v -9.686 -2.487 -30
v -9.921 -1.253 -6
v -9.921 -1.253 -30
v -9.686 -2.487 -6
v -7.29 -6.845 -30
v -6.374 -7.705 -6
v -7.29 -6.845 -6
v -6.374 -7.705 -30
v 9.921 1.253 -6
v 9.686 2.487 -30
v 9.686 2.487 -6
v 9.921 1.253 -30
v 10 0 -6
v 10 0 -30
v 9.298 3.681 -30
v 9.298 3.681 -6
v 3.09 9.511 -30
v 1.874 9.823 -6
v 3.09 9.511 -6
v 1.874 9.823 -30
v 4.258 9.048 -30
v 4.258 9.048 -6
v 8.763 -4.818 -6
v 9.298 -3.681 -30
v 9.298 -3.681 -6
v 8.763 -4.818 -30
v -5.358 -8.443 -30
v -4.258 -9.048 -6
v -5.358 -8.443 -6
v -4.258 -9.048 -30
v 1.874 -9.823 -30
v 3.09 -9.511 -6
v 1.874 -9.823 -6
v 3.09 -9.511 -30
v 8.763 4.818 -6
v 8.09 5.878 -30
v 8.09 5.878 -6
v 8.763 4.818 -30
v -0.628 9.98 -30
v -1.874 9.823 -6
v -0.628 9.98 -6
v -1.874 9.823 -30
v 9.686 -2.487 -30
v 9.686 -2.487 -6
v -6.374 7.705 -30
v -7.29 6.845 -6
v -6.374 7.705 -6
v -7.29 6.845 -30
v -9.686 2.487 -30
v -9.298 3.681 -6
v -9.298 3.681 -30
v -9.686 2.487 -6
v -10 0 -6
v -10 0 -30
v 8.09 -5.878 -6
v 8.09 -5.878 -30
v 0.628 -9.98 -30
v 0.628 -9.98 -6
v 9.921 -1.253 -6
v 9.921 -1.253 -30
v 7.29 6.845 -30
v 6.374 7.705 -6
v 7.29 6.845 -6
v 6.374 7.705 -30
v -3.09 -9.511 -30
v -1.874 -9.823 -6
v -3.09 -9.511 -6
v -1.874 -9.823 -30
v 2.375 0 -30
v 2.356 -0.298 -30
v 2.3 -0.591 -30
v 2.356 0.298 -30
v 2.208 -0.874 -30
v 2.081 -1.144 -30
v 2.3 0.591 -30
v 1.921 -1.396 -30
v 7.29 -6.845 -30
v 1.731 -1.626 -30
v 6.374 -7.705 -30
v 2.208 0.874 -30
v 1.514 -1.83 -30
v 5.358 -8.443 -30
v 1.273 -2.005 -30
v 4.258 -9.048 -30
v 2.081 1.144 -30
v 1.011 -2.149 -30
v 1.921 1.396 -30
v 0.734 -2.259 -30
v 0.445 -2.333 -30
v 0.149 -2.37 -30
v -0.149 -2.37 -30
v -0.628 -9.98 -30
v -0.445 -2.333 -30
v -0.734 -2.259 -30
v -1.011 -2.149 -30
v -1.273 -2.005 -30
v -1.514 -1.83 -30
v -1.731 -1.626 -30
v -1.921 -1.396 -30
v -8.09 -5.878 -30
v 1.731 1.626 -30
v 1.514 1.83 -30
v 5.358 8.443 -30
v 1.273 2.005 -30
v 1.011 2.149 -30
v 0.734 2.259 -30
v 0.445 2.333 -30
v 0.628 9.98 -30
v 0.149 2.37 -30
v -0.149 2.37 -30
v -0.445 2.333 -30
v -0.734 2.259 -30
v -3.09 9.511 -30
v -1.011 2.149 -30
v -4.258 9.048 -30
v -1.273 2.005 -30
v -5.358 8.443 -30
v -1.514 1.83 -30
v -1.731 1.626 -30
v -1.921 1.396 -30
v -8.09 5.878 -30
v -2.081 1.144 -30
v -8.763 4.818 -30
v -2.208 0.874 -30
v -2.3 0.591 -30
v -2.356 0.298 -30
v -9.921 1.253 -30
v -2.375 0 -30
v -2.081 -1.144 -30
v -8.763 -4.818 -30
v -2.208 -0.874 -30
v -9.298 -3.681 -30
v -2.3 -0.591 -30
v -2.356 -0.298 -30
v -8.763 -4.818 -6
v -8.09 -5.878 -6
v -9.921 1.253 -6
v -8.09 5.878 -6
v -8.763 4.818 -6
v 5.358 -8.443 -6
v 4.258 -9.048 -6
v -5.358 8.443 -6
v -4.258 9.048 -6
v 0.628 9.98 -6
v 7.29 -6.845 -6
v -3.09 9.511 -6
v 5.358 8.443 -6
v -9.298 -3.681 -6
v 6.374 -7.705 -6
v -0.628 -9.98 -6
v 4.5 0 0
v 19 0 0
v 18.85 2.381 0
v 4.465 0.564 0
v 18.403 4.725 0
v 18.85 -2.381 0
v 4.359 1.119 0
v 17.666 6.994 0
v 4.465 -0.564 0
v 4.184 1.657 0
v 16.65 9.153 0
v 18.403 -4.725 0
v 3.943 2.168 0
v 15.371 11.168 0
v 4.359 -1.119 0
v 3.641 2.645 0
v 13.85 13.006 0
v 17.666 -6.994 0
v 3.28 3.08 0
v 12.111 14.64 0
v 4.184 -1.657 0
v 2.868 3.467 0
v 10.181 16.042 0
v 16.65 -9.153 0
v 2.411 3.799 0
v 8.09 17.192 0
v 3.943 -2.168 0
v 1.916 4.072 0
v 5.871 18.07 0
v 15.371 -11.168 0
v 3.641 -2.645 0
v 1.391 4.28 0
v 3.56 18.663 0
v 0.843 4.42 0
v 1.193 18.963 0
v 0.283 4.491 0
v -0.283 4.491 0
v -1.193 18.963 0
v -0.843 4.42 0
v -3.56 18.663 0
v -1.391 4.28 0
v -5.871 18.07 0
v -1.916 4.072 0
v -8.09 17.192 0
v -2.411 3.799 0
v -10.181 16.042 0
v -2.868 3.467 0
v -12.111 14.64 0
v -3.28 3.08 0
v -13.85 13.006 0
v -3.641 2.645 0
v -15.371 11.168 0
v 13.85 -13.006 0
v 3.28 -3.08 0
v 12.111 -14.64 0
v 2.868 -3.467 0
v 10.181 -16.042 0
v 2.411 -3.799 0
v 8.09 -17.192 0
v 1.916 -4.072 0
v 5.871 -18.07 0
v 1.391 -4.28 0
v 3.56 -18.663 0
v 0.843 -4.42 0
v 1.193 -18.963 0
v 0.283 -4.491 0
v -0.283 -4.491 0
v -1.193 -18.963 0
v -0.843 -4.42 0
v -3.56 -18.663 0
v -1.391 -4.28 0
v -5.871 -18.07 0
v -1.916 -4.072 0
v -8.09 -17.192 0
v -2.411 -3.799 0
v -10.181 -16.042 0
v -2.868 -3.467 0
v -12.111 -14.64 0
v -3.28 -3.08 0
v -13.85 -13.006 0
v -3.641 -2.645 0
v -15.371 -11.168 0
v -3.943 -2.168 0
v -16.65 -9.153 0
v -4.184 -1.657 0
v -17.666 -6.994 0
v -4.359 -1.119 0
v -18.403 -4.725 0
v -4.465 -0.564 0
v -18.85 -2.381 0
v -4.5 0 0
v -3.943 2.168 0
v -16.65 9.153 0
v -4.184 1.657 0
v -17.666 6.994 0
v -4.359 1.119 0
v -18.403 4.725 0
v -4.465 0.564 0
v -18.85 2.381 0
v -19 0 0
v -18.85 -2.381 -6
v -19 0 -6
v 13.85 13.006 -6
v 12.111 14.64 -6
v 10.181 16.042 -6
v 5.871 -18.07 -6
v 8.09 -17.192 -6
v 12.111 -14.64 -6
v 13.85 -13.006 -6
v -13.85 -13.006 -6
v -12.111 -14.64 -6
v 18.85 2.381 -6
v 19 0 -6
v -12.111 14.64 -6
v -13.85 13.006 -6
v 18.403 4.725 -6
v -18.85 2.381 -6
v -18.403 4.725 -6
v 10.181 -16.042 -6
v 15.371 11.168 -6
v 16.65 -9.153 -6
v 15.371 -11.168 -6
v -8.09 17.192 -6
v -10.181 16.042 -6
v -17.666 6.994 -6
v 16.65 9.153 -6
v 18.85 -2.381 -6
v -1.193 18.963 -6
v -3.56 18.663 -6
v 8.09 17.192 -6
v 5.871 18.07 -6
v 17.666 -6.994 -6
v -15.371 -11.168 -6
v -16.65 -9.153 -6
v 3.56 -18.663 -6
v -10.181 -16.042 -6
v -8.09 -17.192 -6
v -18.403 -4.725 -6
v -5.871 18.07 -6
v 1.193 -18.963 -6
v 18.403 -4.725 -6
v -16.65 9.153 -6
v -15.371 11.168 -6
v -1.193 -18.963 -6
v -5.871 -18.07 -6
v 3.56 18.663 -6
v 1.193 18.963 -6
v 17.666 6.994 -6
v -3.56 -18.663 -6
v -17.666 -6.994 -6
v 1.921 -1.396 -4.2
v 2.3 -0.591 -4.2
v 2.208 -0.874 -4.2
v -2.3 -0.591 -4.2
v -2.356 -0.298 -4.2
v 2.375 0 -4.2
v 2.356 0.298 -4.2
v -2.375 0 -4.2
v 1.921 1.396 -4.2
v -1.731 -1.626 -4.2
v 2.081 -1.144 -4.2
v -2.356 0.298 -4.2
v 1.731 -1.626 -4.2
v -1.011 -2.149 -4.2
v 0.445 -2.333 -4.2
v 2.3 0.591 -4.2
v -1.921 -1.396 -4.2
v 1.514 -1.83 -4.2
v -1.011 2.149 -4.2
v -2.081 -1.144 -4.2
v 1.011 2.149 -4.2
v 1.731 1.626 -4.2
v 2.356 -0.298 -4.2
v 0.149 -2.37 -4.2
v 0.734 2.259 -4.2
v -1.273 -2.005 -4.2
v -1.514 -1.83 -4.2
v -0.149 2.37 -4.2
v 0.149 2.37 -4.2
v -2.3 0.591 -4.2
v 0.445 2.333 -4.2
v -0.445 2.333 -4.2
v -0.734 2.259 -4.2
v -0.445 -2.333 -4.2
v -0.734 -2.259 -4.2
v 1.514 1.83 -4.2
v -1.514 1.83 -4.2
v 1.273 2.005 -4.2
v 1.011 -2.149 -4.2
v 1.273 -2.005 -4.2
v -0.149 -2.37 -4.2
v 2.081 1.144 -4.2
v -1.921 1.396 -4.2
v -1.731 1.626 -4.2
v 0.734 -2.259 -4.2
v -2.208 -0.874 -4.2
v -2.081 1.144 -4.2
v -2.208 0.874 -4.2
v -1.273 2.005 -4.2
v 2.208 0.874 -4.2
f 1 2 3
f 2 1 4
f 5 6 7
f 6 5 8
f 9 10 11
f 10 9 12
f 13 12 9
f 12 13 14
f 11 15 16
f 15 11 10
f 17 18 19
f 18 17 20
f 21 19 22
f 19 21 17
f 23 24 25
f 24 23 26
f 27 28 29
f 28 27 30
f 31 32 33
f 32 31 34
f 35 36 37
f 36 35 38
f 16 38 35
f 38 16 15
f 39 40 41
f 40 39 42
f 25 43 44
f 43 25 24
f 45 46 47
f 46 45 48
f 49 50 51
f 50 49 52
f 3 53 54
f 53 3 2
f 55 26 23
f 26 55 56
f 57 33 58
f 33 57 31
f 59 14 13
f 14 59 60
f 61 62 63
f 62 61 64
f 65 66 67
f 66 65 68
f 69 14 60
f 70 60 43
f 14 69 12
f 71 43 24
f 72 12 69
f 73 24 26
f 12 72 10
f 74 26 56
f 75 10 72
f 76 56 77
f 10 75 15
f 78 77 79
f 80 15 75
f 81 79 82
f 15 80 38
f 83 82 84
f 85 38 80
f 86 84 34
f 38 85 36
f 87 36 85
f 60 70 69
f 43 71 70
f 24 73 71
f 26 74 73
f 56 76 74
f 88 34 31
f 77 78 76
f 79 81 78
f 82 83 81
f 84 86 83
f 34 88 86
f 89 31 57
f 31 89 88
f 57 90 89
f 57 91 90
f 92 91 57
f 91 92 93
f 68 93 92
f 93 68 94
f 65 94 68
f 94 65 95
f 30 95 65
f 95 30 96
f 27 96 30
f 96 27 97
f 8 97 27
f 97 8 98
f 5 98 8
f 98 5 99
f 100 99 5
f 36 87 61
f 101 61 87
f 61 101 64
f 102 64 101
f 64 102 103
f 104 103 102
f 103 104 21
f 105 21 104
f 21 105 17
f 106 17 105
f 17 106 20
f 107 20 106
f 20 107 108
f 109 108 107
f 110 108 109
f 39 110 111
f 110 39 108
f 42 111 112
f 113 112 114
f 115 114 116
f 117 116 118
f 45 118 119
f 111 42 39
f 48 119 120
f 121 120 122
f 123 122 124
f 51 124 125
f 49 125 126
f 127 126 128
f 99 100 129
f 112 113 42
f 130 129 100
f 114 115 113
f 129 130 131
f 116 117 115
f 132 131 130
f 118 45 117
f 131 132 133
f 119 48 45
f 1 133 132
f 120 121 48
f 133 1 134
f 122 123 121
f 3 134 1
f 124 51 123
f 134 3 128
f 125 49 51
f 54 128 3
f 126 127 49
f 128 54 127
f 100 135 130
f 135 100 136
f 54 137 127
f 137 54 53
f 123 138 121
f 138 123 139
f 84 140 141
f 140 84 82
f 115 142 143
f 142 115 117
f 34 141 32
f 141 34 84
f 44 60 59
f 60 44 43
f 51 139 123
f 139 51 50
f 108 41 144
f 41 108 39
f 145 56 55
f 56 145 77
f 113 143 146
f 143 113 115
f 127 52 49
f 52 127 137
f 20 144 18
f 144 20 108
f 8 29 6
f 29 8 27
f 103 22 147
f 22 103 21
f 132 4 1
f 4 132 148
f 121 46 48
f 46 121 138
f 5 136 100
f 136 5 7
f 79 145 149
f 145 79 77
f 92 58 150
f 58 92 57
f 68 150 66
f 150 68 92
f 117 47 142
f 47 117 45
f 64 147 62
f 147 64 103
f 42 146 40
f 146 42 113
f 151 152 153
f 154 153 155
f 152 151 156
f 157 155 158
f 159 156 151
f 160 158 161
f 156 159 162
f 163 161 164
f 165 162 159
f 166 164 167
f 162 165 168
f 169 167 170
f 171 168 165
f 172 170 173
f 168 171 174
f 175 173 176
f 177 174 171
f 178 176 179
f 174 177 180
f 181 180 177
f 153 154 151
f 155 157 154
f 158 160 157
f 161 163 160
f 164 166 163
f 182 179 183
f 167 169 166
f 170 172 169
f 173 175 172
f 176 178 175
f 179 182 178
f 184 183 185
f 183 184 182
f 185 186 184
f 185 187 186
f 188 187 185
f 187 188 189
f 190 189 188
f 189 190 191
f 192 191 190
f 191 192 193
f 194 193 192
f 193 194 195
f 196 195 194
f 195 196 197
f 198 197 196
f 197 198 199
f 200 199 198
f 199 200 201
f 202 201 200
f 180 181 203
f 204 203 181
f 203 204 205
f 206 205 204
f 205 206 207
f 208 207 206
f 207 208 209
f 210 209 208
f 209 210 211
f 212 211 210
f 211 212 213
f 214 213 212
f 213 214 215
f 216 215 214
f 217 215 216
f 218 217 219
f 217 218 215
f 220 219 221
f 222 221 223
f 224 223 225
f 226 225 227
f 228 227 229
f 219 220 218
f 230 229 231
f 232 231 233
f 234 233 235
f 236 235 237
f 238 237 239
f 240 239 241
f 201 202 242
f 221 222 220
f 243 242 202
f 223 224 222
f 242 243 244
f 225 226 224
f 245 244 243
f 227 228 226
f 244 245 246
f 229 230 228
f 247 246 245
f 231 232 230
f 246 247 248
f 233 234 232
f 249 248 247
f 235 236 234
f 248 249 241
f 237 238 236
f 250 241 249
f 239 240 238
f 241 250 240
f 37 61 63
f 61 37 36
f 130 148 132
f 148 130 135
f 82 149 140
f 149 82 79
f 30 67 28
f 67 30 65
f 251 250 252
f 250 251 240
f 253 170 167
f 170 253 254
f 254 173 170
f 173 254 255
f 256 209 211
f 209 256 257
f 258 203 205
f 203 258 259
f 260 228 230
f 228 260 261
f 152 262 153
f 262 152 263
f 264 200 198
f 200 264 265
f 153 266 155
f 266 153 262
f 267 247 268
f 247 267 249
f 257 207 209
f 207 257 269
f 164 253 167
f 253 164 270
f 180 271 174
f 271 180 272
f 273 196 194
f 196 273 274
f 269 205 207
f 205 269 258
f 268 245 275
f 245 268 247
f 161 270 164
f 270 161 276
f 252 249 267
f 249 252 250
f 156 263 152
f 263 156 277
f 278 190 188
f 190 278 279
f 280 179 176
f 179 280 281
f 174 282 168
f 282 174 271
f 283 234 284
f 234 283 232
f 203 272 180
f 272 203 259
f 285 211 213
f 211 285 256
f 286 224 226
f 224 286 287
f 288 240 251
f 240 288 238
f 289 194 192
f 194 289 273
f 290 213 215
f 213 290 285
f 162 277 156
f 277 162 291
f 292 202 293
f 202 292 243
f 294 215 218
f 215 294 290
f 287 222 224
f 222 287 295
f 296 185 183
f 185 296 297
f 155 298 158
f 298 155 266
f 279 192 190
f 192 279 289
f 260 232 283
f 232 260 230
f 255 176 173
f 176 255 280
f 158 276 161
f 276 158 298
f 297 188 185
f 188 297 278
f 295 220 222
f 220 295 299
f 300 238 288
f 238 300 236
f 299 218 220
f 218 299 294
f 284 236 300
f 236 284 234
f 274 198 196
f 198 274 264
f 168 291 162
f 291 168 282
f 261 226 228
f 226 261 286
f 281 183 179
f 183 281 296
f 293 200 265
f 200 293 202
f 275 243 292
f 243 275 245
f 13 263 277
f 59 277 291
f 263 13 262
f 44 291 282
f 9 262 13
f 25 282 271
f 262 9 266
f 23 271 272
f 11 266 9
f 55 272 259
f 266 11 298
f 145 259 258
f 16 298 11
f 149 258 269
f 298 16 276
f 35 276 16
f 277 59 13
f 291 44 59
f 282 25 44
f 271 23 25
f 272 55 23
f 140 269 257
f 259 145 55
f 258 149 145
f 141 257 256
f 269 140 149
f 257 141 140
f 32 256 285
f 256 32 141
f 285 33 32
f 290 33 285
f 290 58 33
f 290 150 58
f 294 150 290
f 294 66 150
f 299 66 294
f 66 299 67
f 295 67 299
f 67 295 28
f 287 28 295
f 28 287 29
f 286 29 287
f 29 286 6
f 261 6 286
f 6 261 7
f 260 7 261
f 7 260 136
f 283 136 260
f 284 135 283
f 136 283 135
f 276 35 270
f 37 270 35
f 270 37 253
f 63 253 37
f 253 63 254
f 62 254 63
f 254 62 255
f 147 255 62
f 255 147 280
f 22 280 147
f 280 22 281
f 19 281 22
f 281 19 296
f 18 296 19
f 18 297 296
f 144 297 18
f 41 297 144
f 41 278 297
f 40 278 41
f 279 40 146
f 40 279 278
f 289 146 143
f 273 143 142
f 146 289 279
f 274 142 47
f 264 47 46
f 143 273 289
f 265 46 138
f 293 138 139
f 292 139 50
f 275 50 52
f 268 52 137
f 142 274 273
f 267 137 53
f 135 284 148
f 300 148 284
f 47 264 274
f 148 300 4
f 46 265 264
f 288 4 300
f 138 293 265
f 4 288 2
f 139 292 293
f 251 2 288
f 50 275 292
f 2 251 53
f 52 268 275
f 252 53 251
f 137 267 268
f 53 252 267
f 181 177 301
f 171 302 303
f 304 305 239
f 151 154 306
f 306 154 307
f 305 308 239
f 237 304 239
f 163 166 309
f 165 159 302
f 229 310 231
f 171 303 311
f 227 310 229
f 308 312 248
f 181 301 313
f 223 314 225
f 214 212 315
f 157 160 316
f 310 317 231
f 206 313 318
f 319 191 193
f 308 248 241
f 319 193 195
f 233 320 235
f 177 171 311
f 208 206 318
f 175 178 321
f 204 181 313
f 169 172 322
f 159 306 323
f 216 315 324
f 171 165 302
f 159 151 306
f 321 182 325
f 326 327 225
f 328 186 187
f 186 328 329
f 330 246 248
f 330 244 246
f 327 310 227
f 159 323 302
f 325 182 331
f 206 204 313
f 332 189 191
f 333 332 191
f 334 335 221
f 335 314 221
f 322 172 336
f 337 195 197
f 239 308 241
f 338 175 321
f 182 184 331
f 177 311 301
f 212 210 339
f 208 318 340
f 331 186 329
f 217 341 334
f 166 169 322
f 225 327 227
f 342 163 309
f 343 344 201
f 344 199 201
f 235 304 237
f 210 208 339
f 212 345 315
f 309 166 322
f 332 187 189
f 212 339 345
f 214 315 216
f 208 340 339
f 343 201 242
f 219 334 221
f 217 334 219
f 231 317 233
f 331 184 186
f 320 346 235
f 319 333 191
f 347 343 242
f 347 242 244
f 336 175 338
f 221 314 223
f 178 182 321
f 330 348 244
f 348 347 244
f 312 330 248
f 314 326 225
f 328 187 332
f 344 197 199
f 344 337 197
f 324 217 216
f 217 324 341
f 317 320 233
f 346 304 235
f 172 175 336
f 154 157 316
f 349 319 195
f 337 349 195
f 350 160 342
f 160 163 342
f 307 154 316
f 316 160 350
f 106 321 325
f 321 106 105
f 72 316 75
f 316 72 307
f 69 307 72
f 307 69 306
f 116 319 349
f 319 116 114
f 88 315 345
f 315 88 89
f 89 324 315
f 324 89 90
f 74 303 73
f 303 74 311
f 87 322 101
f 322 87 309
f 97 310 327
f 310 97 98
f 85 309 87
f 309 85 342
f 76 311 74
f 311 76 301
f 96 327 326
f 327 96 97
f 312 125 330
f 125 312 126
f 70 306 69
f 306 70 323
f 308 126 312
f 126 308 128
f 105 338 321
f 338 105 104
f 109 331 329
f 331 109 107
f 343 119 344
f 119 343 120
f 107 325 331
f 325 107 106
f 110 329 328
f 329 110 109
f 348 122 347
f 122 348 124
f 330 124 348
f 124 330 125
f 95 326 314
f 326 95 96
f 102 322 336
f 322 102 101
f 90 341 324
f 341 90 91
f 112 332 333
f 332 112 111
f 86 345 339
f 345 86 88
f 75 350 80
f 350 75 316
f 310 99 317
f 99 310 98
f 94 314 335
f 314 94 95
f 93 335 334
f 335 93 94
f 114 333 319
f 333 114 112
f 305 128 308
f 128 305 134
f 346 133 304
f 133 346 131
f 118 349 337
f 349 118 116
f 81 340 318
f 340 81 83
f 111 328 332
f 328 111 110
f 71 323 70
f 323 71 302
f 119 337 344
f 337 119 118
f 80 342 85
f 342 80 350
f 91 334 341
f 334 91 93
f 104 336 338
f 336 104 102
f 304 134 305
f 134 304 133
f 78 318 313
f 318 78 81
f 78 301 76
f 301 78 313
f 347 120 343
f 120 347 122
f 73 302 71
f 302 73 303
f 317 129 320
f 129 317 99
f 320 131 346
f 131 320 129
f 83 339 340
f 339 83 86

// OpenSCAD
$fn = 50;


difference() {
	union() {
		translate(v = [0, 0, -30.0000000000]) {
			cylinder(h = 30, r = 10.0000000000);
		}
		translate(v = [0, 0, -6.0000000000]) {
			cylinder(h = 6, r = 19.0000000000);
		}
	}
	union() {
		translate(v = [0, 0, 0]) {
			rotate(a = [0, 0, 0]) {
				difference() {
					union() {
						#translate(v = [0, 0, -30.0000000000]) {
							cylinder(h = 30, r = 2.2500000000);
						}
						#translate(v = [0, 0, -4.2000000000]) {
							cylinder(h = 4.2000000000, r1 = 2.3750000000, r2 = 4.5000000000);
						}
						#translate(v = [0, 0, -30.0000000000]) {
							cylinder(h = 30, r = 2.3750000000);
						}
						#translate(v = [0, 0, -30.0000000000]) {
							cylinder(h = 30, r = 2.2500000000);
						}
					}
					union();
				}
			}
		}
	}
}
